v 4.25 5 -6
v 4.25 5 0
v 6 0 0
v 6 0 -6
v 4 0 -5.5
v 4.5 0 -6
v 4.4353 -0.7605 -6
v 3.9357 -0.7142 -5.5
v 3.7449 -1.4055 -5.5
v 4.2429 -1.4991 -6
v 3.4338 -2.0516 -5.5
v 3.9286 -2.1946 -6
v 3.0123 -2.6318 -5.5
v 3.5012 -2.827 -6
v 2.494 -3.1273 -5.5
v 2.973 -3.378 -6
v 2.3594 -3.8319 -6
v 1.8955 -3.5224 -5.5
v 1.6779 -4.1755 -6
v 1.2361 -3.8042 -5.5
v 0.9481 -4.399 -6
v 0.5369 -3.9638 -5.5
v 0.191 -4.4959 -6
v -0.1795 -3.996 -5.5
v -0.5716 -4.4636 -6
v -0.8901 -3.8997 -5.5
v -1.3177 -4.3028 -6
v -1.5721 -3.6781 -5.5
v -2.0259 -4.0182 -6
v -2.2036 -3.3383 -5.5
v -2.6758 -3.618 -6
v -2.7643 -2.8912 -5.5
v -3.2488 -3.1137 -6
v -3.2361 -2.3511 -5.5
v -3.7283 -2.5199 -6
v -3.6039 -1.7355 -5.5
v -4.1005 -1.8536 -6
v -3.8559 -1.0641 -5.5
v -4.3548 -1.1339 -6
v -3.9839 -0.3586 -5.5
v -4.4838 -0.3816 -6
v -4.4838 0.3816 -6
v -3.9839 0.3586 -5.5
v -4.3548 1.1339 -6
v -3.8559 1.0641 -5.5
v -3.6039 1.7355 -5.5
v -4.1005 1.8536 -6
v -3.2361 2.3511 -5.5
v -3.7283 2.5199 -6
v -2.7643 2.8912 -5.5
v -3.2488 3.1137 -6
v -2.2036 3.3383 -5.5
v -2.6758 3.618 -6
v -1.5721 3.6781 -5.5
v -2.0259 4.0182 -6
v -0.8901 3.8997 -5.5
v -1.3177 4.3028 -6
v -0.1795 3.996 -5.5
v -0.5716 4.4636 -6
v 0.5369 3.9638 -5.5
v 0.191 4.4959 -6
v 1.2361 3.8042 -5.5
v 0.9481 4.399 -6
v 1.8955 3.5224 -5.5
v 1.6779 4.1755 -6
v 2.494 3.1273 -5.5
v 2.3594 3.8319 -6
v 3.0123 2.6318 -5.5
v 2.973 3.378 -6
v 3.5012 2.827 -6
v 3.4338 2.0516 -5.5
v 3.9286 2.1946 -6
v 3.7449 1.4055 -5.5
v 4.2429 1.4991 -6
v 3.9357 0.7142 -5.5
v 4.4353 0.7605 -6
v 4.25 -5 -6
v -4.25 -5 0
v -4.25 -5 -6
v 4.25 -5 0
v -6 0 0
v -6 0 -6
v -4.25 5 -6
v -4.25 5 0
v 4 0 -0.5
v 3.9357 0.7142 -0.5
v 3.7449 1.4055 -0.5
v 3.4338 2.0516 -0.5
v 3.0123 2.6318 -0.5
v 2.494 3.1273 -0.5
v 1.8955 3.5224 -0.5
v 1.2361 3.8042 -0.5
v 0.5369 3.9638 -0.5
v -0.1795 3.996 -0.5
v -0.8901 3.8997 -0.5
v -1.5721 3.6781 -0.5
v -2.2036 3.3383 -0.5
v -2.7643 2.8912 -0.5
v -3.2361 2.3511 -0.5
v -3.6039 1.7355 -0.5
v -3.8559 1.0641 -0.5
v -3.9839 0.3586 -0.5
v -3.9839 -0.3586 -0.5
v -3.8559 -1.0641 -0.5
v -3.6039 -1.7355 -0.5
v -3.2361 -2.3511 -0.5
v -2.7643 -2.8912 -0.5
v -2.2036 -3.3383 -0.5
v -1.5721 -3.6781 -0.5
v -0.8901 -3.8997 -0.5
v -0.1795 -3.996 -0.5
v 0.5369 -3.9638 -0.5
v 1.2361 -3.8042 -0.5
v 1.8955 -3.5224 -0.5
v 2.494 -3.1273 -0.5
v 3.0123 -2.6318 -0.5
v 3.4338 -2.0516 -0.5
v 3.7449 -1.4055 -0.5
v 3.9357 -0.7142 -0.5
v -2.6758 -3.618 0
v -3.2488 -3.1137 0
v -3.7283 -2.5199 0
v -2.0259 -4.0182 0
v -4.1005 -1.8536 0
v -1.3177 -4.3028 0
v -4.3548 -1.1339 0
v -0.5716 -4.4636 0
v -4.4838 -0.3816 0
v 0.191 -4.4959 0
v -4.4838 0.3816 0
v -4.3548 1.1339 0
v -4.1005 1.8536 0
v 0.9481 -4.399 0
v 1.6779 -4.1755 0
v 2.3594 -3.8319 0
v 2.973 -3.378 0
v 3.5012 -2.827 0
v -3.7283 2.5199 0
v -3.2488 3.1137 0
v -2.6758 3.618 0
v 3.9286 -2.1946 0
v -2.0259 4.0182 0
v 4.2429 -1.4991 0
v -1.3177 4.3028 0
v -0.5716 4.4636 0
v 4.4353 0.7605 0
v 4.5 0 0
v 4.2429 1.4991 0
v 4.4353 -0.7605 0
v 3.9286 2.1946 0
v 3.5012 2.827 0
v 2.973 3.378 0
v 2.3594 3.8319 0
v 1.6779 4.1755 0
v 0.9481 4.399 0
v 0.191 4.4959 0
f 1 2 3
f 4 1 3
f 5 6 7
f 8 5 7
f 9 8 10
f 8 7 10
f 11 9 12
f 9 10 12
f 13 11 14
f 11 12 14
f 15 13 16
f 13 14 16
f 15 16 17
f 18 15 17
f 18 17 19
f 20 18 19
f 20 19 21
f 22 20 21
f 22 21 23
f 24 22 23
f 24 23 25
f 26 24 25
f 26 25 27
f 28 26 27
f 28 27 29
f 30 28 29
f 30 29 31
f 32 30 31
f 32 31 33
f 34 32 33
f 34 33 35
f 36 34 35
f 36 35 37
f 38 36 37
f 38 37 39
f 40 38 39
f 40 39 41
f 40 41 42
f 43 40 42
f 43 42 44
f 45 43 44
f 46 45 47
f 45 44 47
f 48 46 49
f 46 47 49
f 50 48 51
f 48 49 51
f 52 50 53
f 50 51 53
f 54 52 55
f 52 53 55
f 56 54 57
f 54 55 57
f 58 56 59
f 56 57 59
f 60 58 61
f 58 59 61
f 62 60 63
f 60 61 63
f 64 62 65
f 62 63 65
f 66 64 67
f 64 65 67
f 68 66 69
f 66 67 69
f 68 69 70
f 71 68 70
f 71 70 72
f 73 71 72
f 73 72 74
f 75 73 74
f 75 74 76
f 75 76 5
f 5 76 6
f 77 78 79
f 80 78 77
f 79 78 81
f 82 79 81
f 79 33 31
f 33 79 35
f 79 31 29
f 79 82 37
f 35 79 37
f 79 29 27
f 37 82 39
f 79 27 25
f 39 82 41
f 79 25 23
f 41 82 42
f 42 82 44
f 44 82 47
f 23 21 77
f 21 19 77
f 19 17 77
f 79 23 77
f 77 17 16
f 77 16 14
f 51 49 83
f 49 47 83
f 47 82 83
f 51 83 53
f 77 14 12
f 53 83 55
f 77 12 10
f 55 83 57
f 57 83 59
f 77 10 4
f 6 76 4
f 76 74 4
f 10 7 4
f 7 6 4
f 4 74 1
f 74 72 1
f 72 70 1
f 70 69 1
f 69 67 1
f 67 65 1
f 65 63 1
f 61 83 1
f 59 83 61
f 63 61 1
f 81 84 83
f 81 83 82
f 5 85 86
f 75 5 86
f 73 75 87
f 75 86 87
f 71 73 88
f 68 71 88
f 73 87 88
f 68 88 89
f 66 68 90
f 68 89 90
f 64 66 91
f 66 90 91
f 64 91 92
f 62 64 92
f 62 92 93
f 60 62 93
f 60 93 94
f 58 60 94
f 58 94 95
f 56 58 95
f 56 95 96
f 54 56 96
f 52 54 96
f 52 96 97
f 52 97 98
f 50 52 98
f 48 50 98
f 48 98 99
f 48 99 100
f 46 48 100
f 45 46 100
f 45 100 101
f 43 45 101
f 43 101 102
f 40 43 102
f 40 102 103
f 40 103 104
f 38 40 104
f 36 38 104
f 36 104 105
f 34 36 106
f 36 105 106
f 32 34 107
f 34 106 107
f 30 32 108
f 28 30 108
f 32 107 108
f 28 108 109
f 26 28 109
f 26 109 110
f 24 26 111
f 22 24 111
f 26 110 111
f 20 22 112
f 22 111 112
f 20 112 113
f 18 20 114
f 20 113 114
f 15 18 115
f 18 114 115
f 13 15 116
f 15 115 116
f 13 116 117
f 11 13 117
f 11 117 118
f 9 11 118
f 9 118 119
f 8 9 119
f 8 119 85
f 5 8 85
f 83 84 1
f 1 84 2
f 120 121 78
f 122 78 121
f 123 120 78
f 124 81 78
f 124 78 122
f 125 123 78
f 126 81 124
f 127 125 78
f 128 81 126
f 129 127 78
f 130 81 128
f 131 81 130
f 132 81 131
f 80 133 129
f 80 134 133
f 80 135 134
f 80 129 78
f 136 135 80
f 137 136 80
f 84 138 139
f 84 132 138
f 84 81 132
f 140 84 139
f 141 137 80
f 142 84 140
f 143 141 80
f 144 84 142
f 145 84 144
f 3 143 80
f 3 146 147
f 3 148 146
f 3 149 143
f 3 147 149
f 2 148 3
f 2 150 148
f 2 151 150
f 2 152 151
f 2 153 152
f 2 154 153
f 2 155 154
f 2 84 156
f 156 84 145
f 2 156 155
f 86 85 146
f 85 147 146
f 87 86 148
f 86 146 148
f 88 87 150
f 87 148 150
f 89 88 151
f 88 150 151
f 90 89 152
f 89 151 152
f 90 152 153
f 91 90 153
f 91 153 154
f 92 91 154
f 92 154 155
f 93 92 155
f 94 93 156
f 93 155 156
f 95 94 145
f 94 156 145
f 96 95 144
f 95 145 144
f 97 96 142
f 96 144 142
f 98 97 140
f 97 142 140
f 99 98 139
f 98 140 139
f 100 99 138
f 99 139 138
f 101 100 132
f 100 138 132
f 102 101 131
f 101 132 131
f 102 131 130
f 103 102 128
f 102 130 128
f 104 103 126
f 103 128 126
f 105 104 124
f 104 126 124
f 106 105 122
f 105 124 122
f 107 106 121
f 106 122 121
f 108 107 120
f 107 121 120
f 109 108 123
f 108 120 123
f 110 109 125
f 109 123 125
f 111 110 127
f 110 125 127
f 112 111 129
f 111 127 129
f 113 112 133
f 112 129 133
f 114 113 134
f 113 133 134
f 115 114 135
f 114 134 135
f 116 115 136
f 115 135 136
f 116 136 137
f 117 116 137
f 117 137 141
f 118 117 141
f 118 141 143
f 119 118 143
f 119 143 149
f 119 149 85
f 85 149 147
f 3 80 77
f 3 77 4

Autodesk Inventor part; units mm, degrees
ref_plane "YZ Plane" through (0, 0, 0) normal (1, 0, 0) x (0, 1, 0)
ref_plane "XZ Plane" through (0, 0, 0) normal (0, 1, 0) x (-1, 0, 0)
ref_plane "XY Plane" through (0, 0, 0) normal (0, 0, 1) x (1, 0, 0)
sketch "Boceto1" plane through (0, 0, 0) normal (0, 0, 1) x (1, 0, 0)
  circle A0 centre (0, 0) radius 4
  line L0 (-37.8416, 0) -> (37.8416, 0) construction
  line L1 (0, 25.1226) -> (0, -25.1226) construction
  line L2 (-4.25, 5) -> (4.25, 5)
  line L3 (-4.25, -5) -> (4.25, -5)
  line L4 (-4.25, 5) -> (-6, 0)
  line L5 (-4.25, -5) -> (-6, 0)
  line L6 (4.25, 5) -> (6, 0)
  line L7 (4.25, -5) -> (6, 0)
  point P0 (0, 5)
  point P1 (0, -5)
  dimension "d0" = 8
  dimension "d1" = 8.5
  dimension "d2" = 8.5
  dimension "d3" = 5
  dimension "d4" = 5
  dimension "d5" = 6
  dimension "d6" = 6
extrude "Extrusión1" add sketch "Boceto1" against normal blind 6
thread "Rosca1" size "M8x0.5" class "6H" standard "ANSI Metric M Profile" length 14
chamfer "Chaflán1" distance 0.5 angle 45 1 edges at (-4, 0, 0)
chamfer "Chaflán2" distance 0.5 angle 45 1 edges at (-4, 0, -6)
equation "\"d2\" = d1"
equation "\"d4\" = d3"
properties part number "2-HUDSON-8-35-TDR HAND PUMP M8x5 PIPE NU"
